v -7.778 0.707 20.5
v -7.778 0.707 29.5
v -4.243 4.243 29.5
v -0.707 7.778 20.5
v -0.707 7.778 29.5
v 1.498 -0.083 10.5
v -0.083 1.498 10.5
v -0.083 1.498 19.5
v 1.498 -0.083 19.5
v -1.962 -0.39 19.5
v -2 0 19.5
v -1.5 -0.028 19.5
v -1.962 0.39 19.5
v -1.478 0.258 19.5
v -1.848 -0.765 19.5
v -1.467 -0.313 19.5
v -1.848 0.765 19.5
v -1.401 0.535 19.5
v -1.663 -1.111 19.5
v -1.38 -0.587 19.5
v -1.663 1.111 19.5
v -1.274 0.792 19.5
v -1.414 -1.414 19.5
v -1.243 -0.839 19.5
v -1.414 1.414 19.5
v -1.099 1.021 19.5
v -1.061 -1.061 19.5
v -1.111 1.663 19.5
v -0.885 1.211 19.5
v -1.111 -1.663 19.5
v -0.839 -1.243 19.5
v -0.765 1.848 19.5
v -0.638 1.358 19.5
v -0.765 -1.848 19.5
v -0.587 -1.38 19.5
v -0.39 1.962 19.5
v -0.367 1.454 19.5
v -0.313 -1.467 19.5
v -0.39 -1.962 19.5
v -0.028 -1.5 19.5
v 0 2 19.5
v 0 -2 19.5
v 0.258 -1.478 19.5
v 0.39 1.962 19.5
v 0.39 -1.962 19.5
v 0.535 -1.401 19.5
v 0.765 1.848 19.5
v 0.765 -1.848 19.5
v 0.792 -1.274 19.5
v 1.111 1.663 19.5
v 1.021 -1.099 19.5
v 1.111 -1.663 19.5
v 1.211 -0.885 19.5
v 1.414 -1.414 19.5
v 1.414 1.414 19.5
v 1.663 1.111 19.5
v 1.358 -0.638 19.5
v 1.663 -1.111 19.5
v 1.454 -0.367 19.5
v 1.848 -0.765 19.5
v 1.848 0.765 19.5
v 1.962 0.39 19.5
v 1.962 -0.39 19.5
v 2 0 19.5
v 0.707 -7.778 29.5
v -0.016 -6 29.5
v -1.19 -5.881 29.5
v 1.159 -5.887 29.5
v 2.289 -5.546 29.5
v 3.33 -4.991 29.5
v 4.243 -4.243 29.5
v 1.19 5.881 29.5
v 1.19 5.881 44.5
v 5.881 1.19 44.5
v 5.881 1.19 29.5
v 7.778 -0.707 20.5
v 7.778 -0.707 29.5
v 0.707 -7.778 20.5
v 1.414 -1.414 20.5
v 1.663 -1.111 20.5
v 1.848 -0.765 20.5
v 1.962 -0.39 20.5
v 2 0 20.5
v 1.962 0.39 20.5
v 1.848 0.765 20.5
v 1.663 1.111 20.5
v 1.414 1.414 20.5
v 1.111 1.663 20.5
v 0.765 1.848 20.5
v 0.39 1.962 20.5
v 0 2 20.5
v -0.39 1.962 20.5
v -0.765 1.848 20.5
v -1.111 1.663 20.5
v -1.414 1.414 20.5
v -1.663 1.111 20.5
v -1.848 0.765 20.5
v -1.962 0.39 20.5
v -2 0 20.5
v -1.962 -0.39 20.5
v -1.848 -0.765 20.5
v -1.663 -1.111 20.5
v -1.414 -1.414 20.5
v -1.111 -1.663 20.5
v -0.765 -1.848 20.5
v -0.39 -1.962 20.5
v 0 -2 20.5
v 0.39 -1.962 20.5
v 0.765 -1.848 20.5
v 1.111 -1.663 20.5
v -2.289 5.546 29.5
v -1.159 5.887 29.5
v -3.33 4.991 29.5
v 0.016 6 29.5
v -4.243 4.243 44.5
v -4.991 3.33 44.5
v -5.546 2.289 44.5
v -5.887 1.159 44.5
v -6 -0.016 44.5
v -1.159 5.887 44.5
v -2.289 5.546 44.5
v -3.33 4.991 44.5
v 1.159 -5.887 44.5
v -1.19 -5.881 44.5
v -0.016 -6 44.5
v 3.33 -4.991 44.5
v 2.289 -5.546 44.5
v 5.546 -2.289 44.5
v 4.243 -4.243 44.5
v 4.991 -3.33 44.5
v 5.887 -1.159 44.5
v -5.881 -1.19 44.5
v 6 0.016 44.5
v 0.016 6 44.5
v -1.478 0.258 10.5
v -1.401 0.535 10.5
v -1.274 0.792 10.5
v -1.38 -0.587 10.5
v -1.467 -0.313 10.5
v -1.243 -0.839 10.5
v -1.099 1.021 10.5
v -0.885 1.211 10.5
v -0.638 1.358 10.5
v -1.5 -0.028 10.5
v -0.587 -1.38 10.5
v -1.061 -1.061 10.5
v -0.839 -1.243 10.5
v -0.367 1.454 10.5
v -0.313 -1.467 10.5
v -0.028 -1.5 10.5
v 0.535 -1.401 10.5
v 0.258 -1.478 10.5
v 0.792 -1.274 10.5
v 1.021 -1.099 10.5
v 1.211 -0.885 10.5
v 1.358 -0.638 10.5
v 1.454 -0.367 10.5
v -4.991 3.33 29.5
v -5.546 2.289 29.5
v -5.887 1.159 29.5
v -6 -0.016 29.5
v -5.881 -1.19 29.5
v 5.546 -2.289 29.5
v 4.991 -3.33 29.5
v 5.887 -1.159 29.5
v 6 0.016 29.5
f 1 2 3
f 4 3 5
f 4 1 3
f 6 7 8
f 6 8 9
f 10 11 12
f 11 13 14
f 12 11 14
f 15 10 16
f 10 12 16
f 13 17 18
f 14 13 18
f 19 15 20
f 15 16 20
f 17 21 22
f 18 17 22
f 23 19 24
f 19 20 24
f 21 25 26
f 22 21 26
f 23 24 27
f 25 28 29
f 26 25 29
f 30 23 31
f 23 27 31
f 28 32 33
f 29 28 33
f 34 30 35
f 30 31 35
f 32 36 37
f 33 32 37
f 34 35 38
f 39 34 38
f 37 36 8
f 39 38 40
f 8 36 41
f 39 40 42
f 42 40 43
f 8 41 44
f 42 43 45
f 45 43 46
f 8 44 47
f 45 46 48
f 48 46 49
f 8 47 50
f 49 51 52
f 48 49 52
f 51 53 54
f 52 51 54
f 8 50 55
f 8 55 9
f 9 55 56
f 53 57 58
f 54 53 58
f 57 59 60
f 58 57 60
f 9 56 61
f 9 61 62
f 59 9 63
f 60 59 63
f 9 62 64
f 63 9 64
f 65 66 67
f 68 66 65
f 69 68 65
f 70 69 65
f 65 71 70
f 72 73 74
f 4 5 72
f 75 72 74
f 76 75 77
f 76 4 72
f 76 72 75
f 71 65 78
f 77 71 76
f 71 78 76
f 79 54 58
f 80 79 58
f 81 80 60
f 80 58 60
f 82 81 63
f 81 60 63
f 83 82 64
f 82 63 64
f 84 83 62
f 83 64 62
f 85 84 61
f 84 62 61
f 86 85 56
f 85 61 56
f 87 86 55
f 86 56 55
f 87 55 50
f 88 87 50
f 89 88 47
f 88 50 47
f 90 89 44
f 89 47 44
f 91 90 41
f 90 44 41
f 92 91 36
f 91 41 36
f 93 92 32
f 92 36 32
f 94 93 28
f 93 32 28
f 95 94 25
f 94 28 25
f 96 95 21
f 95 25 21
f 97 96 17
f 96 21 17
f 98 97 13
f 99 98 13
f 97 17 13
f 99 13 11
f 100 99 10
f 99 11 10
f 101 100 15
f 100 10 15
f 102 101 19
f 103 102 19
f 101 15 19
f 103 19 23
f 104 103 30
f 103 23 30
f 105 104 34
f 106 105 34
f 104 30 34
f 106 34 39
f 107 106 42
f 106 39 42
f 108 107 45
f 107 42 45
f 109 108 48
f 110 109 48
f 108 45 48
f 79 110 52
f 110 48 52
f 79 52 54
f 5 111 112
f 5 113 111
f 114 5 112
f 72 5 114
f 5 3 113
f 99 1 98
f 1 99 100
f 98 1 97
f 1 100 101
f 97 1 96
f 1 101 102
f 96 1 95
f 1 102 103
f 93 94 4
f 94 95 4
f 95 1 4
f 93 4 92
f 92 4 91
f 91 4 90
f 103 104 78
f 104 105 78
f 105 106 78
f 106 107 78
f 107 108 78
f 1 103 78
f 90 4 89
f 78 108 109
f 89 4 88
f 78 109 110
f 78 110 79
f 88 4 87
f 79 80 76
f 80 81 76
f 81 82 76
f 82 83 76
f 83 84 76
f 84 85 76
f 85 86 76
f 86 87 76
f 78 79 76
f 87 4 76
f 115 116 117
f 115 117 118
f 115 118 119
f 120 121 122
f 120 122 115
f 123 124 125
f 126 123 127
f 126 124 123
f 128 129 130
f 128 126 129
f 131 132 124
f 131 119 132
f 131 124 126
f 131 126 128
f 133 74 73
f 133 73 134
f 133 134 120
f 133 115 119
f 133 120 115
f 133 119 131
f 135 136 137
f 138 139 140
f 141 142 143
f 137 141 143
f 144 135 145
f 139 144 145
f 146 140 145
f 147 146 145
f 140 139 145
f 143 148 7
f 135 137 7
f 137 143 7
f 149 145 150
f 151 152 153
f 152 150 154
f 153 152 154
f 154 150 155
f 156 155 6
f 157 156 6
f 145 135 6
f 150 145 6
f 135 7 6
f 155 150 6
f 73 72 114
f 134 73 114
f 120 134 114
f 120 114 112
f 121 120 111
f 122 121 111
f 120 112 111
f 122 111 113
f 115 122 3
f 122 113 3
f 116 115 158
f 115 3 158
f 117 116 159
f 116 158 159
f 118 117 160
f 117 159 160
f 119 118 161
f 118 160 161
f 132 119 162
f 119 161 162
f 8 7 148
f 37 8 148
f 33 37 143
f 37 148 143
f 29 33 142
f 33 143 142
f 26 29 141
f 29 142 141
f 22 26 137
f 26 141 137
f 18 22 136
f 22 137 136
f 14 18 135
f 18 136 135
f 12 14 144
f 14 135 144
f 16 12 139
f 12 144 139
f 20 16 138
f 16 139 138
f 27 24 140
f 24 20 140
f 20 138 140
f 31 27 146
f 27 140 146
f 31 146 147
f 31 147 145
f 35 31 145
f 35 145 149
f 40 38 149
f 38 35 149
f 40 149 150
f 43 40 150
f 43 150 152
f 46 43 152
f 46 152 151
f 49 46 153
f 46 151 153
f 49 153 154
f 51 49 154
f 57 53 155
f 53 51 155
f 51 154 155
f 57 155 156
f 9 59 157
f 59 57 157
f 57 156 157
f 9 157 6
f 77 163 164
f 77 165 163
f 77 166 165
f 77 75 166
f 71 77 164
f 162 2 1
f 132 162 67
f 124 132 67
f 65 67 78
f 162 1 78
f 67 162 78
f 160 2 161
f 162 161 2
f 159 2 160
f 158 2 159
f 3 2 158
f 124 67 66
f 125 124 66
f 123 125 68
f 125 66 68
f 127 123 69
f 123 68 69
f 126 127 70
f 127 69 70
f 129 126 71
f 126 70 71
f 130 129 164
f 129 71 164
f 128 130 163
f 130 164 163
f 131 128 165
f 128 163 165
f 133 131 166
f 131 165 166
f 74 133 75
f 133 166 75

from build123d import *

# Parameters (mm, degrees)
CYLINDER076_R                            = 2
CYLINDER076_DEPTH                        = 1
BOX406008005_W                           = 16
BOX406008005_H                           = 10
BOX406008005_DEPTH                       = 27
CYLINDER077_R                            = 6
CYLINDER077_DEPTH                        = 15
BOX406008006_W                           = 10
BOX406008006_H                           = 10
BOX406008006_DEPTH                       = 12
CYLINDER078_R                            = 1.5
CYLINDER078_DEPTH                        = 10
BOX406008004_W                           = 12
BOX406008004_H                           = 10
BOX406008004_DEPTH                       = 9
FUSION103077013004017004_PLACEMENT_ANGLE = 45


with BuildPart() as boss002:
    # Cylinder076 → Cylinder076 (new body)
    with BuildSketch(Plane.XY.offset(-1)):
        Circle(CYLINDER076_R)
    extrude(amount=CYLINDER076_DEPTH)


with BuildPart() as gearbox005:
    # Box406008005 → Box406008005 (new body)
    with BuildSketch(Plane(origin=(-8, -5, 0), x_dir=(1, 0, 0), z_dir=(0, 0, 1))):
        with Locations((8, 5)):
            Rectangle(BOX406008005_W, BOX406008005_H)
    extrude(amount=BOX406008005_DEPTH)


with BuildPart() as motor002:
    # Cylinder077 → Cylinder077 (new body)
    with BuildSketch(Plane.XY.offset(9)):
        Circle(CYLINDER077_R)
    extrude(amount=CYLINDER077_DEPTH)

    # Common001: intersect gearbox005
    add(gearbox005.part, mode=Mode.INTERSECT)


with BuildPart() as cube341:
    # Box406008006 → Box406008006 (new body)
    with BuildSketch(Plane(origin=(-5, 1, -11), x_dir=(1, 0, 0), z_dir=(0, 0, 1))):
        with Locations((5, 5)):
            Rectangle(BOX406008006_W, BOX406008006_H)
    extrude(amount=BOX406008006_DEPTH)


with BuildPart() as shaft002:
    # Cylinder078 → Cylinder078 (new body)
    with BuildSketch(Plane.XY.offset(-10)):
        Circle(CYLINDER078_R)
    extrude(amount=CYLINDER078_DEPTH)

    # Cut001: cut Cube341
    add(cube341.part, mode=Mode.SUBTRACT)


with BuildPart() as motor_assembled:
    # Box406008004 → Box406008004 (new body)
    with BuildSketch(Plane(origin=(-6, -5, 0), x_dir=(1, 0, 0), z_dir=(0, 0, 1))):
        with Locations((6, 5)):
            Rectangle(BOX406008004_W, BOX406008004_H)
    extrude(amount=BOX406008004_DEPTH)

    # Fusion103077013004017004: union boss002, motor002, shaft002
    add(boss002.part)
    add(motor002.part)
    add(shaft002.part)


with BuildPart() as motor_assembled_1:
    # Fusion103077013004017004 placement: moved
    add(motor_assembled.part.moved(Location((0, 0, 20.5))).rotate(Axis((0, 0, 20.5), (0, 0, -1)), FUSION103077013004017004_PLACEMENT_ANGLE))


solid = motor_assembled_1.part
